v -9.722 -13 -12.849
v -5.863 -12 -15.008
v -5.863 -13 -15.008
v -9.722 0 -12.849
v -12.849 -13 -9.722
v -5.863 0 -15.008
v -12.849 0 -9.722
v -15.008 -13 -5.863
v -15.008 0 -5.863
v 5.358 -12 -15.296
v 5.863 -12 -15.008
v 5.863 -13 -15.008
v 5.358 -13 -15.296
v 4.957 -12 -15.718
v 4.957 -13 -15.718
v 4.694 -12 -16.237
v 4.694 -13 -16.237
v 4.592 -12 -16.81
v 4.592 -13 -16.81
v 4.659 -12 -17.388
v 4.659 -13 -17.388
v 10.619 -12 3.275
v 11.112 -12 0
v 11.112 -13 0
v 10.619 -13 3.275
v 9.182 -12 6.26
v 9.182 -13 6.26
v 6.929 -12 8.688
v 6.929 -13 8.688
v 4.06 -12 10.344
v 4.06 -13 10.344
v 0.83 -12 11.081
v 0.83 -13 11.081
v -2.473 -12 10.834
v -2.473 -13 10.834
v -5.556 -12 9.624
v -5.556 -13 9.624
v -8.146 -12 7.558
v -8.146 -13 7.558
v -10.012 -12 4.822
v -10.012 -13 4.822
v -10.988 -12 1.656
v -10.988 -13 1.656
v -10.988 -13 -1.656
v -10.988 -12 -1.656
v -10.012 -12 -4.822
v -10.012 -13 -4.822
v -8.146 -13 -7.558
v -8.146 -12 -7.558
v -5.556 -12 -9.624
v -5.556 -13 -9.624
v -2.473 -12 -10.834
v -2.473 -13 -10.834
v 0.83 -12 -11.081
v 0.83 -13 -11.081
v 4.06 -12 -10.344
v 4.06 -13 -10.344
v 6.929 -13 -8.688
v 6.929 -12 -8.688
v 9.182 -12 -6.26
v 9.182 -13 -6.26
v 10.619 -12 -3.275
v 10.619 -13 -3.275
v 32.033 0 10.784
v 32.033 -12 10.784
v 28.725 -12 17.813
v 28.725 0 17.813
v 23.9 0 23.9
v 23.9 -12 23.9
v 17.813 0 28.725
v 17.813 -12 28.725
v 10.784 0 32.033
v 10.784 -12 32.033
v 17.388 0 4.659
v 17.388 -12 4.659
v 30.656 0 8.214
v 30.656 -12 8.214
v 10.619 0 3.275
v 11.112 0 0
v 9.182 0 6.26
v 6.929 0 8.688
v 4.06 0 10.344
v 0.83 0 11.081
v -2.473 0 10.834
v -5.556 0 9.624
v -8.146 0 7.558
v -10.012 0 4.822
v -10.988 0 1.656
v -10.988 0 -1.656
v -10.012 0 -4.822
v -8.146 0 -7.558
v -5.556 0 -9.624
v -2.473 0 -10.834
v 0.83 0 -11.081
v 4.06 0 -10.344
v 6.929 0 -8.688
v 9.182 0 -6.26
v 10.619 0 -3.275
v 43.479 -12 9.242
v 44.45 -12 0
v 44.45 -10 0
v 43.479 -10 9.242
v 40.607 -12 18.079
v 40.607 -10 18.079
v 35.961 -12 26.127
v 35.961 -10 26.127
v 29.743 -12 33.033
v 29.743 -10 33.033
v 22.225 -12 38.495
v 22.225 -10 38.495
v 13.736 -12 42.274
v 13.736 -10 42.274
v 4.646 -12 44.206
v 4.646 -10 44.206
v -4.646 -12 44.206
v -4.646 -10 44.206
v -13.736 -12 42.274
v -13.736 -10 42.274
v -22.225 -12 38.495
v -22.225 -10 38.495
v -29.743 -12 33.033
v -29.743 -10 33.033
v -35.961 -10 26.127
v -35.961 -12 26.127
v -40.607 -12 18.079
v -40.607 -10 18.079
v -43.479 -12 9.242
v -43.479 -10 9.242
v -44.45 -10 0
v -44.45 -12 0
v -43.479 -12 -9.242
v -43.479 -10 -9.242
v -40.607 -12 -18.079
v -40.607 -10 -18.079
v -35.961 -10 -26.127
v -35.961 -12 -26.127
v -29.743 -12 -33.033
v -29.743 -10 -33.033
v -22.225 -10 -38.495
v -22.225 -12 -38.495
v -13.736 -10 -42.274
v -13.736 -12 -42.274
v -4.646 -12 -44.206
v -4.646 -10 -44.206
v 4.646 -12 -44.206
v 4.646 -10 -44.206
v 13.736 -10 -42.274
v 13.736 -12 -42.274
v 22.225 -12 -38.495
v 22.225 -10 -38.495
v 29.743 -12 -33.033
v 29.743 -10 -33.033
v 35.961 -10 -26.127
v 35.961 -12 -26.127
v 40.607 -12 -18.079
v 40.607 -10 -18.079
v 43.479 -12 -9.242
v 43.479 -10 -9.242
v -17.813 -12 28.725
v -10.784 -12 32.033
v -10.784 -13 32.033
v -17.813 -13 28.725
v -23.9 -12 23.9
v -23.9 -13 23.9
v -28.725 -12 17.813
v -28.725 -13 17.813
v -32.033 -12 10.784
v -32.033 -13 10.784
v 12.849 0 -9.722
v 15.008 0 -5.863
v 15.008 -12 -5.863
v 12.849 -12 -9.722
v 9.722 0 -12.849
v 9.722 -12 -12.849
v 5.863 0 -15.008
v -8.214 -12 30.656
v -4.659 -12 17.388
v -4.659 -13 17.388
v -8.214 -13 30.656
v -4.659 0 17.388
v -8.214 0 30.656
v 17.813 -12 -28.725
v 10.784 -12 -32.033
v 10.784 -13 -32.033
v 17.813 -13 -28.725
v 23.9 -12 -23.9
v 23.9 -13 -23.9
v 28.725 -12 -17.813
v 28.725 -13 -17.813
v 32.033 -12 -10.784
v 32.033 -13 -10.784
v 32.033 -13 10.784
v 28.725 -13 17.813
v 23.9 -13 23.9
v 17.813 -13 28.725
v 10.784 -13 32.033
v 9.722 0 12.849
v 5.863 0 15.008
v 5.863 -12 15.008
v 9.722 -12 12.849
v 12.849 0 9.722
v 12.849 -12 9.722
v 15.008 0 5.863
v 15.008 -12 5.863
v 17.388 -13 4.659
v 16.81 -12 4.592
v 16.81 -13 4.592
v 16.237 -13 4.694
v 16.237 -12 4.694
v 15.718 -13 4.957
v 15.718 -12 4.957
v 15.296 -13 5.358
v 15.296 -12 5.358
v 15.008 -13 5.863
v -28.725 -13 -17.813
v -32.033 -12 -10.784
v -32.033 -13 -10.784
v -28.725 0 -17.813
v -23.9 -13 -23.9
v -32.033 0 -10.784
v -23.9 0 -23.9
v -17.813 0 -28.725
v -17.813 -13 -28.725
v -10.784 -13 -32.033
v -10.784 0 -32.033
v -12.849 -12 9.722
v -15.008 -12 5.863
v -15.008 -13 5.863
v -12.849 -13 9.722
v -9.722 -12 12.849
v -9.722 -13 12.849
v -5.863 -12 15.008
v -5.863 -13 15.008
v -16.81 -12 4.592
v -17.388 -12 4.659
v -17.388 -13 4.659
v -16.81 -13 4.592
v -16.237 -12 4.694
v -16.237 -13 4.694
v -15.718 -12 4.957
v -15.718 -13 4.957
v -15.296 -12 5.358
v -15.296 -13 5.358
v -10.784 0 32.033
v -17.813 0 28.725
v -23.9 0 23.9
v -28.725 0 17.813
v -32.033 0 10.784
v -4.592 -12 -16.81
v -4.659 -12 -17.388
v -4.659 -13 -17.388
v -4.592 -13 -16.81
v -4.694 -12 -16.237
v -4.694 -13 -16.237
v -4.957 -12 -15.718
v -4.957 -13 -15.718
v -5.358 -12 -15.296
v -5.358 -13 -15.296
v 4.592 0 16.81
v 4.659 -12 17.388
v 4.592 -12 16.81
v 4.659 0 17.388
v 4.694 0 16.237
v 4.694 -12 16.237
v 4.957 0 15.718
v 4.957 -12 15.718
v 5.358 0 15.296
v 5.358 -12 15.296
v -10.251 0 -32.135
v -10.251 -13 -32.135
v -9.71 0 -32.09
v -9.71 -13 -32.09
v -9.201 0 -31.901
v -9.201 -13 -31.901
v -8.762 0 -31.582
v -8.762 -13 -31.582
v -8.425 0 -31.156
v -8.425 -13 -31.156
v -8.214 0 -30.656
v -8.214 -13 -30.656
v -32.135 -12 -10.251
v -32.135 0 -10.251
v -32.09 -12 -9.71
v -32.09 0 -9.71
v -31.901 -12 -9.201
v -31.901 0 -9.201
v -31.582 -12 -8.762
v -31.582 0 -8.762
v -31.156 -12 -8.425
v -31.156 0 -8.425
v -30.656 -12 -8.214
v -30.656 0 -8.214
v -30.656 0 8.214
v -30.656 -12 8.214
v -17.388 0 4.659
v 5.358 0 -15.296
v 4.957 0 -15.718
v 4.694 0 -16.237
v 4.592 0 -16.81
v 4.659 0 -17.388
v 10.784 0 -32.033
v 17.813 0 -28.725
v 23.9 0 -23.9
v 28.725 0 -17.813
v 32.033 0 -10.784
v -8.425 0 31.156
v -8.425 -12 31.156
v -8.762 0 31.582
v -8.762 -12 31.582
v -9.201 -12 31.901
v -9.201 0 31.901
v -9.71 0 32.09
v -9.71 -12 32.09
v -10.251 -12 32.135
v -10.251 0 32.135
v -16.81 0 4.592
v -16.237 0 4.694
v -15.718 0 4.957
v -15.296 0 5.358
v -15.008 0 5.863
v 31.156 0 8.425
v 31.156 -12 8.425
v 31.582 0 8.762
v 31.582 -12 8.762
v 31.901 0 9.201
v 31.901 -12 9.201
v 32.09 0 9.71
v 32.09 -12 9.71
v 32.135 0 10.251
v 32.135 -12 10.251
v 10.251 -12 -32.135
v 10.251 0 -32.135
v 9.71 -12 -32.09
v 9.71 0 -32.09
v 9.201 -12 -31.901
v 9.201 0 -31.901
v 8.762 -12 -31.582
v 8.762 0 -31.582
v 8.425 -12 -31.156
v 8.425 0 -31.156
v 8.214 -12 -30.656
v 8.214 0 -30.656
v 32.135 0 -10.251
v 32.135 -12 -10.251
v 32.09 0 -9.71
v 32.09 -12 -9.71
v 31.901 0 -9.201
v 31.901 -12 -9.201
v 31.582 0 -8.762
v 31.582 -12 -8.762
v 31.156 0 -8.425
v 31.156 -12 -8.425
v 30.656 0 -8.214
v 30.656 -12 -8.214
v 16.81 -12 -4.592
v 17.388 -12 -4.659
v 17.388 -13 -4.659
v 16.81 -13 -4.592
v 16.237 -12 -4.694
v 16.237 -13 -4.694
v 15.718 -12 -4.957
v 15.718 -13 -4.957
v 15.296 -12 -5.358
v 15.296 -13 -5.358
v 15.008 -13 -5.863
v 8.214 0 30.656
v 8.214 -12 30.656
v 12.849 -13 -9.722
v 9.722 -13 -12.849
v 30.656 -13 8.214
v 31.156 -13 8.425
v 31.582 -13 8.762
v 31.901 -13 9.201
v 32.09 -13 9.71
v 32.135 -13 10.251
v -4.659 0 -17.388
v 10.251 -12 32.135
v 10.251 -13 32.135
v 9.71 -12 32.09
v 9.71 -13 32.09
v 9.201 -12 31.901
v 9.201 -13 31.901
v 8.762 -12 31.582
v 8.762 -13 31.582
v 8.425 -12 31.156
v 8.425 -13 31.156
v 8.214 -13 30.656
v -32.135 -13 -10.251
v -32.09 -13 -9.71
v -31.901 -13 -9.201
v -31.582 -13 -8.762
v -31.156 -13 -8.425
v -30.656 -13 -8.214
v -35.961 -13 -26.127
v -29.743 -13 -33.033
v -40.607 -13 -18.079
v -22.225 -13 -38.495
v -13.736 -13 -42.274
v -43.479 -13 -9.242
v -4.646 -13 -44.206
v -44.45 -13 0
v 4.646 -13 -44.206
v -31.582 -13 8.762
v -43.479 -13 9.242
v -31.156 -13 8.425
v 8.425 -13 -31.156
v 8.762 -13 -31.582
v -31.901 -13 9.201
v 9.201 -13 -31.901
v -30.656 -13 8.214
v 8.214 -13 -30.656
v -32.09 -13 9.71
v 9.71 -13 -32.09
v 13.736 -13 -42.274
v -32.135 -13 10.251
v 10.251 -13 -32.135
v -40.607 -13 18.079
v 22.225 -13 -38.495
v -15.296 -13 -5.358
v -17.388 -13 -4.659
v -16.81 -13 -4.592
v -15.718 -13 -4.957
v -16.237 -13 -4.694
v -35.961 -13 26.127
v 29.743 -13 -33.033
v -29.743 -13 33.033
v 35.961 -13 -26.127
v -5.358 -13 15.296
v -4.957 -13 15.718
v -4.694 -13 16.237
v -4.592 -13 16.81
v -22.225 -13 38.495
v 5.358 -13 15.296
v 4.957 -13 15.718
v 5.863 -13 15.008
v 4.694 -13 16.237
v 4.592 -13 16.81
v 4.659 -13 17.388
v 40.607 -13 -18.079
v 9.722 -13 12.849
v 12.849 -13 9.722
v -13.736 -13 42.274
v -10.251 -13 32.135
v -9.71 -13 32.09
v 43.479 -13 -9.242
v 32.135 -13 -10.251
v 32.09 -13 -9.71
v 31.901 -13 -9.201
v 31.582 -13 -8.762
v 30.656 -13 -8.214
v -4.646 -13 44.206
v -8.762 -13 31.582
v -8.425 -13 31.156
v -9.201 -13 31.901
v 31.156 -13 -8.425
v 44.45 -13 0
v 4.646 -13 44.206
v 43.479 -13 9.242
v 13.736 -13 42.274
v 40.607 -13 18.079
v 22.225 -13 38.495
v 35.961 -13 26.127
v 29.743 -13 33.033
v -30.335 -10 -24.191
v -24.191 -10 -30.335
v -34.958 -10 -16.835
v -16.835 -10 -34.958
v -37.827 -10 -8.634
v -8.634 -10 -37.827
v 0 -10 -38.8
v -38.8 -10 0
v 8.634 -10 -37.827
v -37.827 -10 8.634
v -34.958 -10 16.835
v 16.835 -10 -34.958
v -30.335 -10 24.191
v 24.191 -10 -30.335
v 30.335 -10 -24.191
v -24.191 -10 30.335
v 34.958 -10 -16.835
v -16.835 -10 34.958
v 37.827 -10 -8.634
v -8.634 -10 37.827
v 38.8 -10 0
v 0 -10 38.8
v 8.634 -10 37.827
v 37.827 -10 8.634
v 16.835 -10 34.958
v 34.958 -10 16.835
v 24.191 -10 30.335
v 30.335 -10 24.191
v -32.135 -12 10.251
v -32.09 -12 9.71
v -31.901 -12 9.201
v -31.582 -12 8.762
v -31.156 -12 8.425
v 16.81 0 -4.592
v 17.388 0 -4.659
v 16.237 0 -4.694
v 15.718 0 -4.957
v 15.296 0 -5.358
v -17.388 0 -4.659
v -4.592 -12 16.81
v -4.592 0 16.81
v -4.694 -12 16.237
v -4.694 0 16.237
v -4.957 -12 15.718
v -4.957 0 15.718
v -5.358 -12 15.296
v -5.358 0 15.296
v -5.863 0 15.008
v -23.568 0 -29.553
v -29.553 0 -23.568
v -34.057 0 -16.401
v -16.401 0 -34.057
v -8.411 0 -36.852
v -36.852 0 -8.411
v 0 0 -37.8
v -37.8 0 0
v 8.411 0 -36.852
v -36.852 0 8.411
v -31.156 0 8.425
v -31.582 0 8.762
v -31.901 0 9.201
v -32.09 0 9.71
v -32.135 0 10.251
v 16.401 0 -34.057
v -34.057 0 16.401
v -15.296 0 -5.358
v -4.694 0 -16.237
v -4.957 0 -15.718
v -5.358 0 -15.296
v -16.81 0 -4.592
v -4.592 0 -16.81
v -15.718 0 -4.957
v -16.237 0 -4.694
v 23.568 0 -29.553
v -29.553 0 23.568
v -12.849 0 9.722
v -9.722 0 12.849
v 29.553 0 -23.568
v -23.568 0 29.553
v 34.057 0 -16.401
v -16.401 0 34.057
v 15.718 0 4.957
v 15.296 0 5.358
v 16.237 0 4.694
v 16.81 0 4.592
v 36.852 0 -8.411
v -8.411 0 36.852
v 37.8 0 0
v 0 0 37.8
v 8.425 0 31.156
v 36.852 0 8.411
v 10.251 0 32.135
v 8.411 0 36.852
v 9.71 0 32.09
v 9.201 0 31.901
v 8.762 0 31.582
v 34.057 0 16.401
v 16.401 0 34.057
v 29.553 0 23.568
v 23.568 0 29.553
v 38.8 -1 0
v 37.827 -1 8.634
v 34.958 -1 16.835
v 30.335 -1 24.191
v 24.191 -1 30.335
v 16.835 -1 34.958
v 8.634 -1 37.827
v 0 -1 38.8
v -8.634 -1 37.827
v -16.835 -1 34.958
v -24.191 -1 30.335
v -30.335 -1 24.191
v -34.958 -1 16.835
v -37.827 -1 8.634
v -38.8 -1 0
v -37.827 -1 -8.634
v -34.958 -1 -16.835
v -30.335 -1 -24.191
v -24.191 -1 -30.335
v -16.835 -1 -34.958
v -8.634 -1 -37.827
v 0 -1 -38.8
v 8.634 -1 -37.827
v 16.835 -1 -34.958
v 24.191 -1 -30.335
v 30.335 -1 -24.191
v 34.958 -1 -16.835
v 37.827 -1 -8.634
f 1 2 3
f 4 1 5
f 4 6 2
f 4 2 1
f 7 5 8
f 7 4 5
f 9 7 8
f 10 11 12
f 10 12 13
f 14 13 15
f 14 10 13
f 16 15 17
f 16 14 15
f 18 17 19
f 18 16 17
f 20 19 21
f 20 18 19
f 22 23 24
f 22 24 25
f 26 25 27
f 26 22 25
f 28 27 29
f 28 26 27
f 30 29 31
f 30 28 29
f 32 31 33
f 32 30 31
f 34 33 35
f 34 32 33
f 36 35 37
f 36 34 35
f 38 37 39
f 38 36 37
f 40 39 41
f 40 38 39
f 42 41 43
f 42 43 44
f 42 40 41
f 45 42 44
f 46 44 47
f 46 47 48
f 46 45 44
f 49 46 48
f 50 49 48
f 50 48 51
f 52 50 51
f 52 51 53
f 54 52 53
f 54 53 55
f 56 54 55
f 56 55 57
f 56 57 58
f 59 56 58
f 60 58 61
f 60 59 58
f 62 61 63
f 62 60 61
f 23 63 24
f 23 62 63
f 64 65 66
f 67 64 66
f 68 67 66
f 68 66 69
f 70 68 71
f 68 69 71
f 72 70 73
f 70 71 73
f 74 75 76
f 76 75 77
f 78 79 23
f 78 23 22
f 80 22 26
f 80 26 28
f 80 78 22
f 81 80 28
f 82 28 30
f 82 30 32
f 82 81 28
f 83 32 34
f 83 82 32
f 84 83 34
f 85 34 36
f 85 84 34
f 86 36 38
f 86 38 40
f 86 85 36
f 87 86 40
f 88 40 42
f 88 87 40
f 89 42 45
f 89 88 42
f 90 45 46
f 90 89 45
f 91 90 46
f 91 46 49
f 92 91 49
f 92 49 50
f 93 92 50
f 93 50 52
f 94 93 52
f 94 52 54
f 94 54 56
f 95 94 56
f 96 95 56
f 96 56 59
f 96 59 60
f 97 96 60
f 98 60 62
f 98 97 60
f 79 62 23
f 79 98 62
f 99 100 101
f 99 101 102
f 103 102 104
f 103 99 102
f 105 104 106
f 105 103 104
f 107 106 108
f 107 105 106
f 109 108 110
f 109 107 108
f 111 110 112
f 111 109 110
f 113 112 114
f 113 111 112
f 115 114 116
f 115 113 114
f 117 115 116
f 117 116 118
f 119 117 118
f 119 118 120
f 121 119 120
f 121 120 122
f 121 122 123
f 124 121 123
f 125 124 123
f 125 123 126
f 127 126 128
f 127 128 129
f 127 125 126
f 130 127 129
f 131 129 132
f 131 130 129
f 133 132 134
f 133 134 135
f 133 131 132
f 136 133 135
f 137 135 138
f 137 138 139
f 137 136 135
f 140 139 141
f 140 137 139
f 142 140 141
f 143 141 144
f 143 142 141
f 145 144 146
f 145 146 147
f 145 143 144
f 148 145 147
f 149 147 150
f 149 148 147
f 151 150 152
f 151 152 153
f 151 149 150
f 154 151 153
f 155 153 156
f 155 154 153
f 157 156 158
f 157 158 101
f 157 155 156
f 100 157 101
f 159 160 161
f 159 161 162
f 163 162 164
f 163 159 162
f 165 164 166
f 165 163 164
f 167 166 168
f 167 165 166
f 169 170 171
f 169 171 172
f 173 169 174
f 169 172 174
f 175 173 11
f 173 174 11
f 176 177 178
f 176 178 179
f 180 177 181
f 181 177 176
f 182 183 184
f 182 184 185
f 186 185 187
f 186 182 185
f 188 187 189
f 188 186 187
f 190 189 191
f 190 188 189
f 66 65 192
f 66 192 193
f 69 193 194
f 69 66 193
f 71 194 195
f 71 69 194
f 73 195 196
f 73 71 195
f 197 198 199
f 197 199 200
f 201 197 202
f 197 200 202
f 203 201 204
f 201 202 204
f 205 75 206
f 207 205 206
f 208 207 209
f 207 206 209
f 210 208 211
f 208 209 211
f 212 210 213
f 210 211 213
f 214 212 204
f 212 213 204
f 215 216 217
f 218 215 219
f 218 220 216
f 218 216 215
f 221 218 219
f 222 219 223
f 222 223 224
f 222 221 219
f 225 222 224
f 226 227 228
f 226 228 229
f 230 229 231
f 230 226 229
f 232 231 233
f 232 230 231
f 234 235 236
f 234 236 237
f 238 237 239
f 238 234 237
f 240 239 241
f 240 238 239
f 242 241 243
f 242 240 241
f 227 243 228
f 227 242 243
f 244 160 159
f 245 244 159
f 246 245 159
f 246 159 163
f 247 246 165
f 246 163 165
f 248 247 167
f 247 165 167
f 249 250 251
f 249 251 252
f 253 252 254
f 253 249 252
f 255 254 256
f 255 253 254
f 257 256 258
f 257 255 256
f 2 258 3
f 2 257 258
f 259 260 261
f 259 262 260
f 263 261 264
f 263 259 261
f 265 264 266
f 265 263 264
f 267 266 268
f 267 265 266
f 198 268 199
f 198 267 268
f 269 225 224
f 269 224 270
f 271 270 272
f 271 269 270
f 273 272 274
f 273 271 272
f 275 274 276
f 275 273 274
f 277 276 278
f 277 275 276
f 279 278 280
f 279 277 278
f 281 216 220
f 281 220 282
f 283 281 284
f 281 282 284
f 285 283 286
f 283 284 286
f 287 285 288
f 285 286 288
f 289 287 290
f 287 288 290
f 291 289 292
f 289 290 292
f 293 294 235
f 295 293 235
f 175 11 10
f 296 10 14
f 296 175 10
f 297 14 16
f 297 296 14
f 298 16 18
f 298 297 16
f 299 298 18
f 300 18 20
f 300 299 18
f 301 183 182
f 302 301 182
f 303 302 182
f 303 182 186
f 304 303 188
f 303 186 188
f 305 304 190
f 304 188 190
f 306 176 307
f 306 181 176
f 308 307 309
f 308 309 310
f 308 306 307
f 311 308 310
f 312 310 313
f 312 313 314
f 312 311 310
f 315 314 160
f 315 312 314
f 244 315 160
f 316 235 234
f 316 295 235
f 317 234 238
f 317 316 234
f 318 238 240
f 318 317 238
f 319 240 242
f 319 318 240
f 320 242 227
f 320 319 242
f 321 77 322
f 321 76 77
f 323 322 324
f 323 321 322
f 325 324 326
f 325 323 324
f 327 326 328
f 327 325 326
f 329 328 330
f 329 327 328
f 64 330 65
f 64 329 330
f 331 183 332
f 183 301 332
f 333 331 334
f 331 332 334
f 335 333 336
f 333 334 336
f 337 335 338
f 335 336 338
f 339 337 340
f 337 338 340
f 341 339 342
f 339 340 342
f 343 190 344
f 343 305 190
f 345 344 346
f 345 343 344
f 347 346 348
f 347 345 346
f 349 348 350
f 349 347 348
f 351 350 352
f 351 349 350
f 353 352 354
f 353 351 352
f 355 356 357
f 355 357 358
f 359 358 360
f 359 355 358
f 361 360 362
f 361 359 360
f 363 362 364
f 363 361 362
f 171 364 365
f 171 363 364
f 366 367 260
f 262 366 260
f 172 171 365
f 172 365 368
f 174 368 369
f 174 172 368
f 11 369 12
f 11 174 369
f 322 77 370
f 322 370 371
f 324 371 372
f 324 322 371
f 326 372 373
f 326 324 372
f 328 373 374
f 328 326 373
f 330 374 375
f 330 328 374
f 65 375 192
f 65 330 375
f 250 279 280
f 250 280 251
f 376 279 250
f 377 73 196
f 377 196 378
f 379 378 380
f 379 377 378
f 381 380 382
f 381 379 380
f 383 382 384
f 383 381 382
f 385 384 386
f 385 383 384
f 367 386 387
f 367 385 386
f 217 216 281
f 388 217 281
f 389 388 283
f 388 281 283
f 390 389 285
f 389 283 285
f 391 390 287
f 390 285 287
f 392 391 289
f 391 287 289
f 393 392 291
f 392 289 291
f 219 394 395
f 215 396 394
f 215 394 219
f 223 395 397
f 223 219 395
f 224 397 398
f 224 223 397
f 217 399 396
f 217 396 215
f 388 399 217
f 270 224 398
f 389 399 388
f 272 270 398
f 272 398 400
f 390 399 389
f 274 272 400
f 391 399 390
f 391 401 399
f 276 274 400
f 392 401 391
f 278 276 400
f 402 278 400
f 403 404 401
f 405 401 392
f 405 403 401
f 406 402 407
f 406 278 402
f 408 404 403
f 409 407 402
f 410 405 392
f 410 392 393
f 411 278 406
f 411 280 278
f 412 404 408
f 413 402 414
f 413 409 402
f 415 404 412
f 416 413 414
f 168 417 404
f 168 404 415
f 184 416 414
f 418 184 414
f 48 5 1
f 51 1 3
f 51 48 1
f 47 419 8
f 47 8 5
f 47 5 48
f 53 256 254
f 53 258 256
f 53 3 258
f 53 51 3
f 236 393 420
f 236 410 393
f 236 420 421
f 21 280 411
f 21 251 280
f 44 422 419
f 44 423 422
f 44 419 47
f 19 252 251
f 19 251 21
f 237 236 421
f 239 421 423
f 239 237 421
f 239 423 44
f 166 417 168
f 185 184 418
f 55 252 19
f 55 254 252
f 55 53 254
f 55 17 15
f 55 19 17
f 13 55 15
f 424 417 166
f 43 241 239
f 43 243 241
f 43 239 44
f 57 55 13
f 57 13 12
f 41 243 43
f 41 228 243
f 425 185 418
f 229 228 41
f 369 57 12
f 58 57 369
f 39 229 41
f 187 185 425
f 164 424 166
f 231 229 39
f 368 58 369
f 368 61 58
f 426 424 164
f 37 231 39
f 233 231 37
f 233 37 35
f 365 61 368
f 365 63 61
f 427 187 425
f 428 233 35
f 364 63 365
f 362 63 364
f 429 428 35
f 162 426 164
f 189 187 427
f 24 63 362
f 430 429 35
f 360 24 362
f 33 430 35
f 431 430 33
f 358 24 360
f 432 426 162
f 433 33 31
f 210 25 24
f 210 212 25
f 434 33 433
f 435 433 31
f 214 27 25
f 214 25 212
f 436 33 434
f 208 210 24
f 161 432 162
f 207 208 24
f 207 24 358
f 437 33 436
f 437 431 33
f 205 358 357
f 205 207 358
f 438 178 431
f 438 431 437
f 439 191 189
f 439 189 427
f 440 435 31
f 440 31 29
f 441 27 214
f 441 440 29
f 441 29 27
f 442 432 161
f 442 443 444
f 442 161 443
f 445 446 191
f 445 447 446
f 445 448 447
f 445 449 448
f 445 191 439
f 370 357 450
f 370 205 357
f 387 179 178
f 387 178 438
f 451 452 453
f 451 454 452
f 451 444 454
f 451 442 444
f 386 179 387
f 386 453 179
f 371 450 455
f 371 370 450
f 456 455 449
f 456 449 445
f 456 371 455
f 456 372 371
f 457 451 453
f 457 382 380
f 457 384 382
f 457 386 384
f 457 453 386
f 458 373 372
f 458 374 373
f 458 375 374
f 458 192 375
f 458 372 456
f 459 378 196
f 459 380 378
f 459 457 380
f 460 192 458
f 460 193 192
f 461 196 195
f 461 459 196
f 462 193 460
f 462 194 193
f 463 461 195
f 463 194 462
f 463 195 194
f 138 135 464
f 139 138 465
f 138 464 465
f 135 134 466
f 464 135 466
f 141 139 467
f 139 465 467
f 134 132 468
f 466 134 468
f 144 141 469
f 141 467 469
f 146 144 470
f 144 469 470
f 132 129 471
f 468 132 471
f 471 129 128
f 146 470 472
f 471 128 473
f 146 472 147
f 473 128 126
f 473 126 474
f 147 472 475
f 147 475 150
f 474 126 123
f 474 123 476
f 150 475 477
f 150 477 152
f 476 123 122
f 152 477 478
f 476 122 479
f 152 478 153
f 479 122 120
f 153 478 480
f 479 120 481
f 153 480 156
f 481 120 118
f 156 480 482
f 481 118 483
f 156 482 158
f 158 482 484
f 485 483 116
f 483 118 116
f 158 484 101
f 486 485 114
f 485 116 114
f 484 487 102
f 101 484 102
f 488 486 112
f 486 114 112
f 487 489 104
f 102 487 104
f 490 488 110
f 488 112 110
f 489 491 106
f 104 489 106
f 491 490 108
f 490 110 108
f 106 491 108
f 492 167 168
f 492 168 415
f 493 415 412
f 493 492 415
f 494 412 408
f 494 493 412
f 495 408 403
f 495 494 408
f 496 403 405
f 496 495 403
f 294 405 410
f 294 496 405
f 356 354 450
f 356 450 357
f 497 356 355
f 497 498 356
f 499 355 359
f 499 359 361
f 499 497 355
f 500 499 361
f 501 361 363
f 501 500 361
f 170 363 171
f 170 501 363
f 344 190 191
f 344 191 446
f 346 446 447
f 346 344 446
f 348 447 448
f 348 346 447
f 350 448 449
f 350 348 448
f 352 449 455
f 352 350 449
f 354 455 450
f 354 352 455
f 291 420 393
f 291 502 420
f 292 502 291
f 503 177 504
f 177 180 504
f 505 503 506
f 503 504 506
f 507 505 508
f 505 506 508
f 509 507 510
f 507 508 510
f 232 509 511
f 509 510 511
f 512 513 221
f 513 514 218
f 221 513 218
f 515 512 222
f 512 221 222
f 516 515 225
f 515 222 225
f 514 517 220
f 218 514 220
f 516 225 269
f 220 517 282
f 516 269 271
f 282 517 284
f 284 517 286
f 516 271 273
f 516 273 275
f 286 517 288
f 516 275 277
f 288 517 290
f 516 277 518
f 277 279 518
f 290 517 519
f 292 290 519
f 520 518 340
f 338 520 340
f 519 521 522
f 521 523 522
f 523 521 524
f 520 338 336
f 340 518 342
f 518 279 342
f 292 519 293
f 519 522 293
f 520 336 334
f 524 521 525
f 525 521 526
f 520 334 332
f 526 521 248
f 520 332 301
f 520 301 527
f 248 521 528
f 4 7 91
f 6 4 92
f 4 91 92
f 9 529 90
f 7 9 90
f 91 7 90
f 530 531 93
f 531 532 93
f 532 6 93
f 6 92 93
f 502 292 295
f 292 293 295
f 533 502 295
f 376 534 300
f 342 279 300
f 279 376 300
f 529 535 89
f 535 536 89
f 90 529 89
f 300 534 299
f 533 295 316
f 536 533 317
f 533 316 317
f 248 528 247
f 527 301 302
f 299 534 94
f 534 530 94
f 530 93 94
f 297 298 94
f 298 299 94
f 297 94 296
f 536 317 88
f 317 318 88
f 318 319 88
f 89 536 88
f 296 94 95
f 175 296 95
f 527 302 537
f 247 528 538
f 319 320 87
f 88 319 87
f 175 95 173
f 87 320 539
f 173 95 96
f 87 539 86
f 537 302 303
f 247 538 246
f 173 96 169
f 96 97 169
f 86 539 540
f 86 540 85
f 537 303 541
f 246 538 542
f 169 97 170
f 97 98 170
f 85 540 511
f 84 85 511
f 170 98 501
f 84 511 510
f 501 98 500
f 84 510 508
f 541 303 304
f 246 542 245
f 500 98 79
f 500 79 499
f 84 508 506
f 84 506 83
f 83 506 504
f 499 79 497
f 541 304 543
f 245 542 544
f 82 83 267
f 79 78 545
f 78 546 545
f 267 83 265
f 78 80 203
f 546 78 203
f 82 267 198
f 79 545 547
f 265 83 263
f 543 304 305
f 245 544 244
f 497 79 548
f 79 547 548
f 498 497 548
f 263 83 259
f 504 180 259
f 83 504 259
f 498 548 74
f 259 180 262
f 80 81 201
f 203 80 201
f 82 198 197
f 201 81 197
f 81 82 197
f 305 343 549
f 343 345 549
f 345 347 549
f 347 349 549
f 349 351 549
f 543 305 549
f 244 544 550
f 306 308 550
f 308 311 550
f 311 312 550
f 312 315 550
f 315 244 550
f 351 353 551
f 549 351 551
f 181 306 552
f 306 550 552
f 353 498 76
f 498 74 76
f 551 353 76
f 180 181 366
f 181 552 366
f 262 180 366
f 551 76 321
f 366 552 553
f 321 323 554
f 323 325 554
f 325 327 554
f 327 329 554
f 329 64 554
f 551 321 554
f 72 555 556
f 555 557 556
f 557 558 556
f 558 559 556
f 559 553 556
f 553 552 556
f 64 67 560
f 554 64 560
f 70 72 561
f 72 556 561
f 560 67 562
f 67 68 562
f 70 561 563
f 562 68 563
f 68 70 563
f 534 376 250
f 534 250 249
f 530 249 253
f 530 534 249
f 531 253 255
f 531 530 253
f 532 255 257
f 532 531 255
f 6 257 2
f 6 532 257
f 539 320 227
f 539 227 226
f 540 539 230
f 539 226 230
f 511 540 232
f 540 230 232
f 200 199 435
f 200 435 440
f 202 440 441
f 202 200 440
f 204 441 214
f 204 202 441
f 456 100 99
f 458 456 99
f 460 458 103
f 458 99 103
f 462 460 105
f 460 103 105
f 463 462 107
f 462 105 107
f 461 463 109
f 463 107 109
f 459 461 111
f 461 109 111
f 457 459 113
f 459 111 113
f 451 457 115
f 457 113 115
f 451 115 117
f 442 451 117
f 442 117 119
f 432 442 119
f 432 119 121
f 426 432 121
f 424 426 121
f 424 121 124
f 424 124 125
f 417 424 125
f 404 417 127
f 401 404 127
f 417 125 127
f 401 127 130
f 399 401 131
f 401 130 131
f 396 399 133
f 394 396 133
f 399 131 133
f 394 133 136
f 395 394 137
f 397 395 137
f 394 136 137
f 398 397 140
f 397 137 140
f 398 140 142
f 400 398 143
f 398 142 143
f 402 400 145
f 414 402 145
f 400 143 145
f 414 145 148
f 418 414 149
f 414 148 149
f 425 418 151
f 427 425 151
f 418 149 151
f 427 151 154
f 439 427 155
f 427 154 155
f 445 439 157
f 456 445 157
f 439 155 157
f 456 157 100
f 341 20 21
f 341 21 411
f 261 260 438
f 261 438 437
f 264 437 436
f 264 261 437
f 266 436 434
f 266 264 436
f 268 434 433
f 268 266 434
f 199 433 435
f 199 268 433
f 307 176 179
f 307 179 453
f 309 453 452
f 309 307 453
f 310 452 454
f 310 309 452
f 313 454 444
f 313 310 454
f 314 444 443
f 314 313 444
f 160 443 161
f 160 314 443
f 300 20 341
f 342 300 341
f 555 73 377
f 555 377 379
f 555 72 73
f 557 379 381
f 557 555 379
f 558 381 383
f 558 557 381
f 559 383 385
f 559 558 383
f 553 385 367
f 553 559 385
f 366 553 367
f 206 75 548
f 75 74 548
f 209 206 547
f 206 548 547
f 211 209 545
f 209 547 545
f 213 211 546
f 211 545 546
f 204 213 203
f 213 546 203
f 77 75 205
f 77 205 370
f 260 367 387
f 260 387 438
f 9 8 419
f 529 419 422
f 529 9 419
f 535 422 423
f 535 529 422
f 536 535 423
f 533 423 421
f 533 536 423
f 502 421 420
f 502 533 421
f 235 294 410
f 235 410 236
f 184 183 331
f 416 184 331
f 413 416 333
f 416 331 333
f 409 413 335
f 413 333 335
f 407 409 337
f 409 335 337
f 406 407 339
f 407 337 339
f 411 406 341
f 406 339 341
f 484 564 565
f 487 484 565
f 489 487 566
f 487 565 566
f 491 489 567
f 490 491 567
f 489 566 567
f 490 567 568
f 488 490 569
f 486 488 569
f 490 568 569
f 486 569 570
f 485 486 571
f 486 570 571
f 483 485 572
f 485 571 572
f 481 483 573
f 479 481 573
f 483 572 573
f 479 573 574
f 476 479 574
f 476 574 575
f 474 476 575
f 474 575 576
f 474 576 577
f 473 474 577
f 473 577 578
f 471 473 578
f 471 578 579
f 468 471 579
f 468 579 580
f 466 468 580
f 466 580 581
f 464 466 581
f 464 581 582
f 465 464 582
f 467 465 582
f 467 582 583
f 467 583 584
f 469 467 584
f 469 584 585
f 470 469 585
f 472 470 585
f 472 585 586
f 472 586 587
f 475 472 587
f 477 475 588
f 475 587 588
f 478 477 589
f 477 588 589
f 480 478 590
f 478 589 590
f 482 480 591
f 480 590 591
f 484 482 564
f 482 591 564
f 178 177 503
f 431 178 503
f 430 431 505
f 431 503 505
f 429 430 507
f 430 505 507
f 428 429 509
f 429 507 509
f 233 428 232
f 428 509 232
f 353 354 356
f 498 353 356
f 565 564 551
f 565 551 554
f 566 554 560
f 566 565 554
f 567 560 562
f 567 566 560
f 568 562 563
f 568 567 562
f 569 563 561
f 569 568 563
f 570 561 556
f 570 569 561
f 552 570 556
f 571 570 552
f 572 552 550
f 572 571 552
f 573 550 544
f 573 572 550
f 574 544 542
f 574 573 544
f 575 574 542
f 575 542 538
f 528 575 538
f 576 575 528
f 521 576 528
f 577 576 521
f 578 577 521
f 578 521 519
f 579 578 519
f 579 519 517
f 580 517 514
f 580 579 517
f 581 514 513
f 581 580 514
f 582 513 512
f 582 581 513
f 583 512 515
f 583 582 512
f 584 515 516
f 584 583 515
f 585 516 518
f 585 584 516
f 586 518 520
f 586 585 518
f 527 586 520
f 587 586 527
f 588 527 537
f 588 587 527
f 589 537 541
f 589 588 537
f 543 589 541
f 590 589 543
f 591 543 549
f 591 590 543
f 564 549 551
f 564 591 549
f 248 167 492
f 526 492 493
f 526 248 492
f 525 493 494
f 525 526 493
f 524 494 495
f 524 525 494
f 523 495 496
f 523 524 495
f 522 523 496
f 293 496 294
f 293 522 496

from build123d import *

# Parameters (mm, degrees)
F0_R     = 38.8
F0_R_2   = 11.1125
F1_DEPTH = 12
F2_R     = 44.45
F2_R_2   = 38.8
F3_DEPTH = 2
F6_DEPTH = 25
F7_R     = 2
F8_SIZE  = 1
F9_DEPTH = 1


with BuildPart() as f1:
    # F0 (on Front) → F1 (new body)
    with BuildSketch(Plane.XZ):
        Circle(F0_R)
        Circle(F0_R_2, mode=Mode.SUBTRACT)
    extrude(amount=F1_DEPTH)

    # F2 (on face) → F3 (join)
    with BuildSketch(Plane.XZ.offset(12)):
        Circle(F2_R)
        Circle(F2_R_2, mode=Mode.SUBTRACT)
    extrude(amount=-F3_DEPTH)

    # F5 (on face) → F6 (cut)
    with BuildSketch(Plane.XZ.offset(12)):
        with BuildLine():
            ThreePointArc((8.7480837245, -32.6482929286), (23.9002092041, -23.9002092041), (32.6482929286, -8.7480837245))
            Line((32.6482929286, -8.7480837245), (15.5634798761, -4.1702218642))
            ThreePointArc((15.5634798761, -4.1702218642), (11.3932580119, -11.3932580119), (4.1702218642, -15.5634798761))
            Line((4.1702218642, -15.5634798761), (8.7480837245, -32.6482929286))
        make_face()
        with BuildLine():
            ThreePointArc((-32.6482929286, -8.7480837245), (-23.9002092041, -23.9002092041), (-8.7480837245, -32.6482929286))
            Line((-8.7480837245, -32.6482929286), (-4.1702218642, -15.5634798761))
            ThreePointArc((-4.1702218642, -15.5634798761), (-11.3932580119, -11.3932580119), (-15.5634798761, -4.1702218642))
            Line((-15.5634798761, -4.1702218642), (-32.6482929286, -8.7480837245))
        make_face()
        with BuildLine():
            Line((-4.1702218642, 15.5634798761), (-8.7480837245, 32.6482929286))
            ThreePointArc((-8.7480837245, 32.6482929286), (-23.9002092041, 23.9002092041), (-32.6482929286, 8.7480837245))
            Line((-32.6482929286, 8.7480837245), (-15.5634798761, 4.1702218642))
            ThreePointArc((-15.5634798761, 4.1702218642), (-11.3932580119, 11.3932580119), (-4.1702218642, 15.5634798761))
        make_face()
        with BuildLine():
            Line((15.5634798761, 4.1702218642), (32.6482929286, 8.7480837245))
            ThreePointArc((32.6482929286, 8.7480837245), (23.9002092041, 23.9002092041), (8.7480837245, 32.6482929286))
            Line((8.7480837245, 32.6482929286), (4.1702218642, 15.5634798761))
            ThreePointArc((4.1702218642, 15.5634798761), (11.3932580119, 11.3932580119), (15.5634798761, 4.1702218642))
        make_face()
    extrude(amount=-F6_DEPTH, mode=Mode.SUBTRACT)

    # F7
    f7_edges = [f1.edges().sort_by_distance(p)[0] for p in [
        (-8.748084, -6, -32.648293),
        (-4.170222, -6, -15.56348),
        (-15.56348, -6, -4.170222),
        (-32.648293, -6, -8.748084),
        (4.170222, -6, -15.56348),
        (8.748084, -6, -32.648293),
        (15.56348, -6, -4.170222),
        (32.648293, -6, -8.748084),
        (8.748084, -6, 32.648293),
        (32.648293, -6, 8.748084),
        (15.56348, -6, 4.170222),
        (4.170222, -6, 15.56348),
        (-4.170222, -6, 15.56348),
        (-15.56348, -6, 4.170222),
        (-8.748084, -6, 32.648293),
        (-32.648293, -6, 8.748084),
    ]]
    fillet(f7_edges, radius=F7_R)

    # F8
    f8_edges = [f1.edges().sort_by_distance(p)[0] for p in [
        (-38.8, 0, 0),
    ]]
    chamfer(f8_edges, length=F8_SIZE)

    # F9 (add): a face of the model
    f9_faces = [f1.faces().sort_by_distance(p)[0] for p in [
        (-10.5042580119, -12, -10.5042580119),
    ]]
    extrude(f9_faces, amount=F9_DEPTH)


solid = f1.part
